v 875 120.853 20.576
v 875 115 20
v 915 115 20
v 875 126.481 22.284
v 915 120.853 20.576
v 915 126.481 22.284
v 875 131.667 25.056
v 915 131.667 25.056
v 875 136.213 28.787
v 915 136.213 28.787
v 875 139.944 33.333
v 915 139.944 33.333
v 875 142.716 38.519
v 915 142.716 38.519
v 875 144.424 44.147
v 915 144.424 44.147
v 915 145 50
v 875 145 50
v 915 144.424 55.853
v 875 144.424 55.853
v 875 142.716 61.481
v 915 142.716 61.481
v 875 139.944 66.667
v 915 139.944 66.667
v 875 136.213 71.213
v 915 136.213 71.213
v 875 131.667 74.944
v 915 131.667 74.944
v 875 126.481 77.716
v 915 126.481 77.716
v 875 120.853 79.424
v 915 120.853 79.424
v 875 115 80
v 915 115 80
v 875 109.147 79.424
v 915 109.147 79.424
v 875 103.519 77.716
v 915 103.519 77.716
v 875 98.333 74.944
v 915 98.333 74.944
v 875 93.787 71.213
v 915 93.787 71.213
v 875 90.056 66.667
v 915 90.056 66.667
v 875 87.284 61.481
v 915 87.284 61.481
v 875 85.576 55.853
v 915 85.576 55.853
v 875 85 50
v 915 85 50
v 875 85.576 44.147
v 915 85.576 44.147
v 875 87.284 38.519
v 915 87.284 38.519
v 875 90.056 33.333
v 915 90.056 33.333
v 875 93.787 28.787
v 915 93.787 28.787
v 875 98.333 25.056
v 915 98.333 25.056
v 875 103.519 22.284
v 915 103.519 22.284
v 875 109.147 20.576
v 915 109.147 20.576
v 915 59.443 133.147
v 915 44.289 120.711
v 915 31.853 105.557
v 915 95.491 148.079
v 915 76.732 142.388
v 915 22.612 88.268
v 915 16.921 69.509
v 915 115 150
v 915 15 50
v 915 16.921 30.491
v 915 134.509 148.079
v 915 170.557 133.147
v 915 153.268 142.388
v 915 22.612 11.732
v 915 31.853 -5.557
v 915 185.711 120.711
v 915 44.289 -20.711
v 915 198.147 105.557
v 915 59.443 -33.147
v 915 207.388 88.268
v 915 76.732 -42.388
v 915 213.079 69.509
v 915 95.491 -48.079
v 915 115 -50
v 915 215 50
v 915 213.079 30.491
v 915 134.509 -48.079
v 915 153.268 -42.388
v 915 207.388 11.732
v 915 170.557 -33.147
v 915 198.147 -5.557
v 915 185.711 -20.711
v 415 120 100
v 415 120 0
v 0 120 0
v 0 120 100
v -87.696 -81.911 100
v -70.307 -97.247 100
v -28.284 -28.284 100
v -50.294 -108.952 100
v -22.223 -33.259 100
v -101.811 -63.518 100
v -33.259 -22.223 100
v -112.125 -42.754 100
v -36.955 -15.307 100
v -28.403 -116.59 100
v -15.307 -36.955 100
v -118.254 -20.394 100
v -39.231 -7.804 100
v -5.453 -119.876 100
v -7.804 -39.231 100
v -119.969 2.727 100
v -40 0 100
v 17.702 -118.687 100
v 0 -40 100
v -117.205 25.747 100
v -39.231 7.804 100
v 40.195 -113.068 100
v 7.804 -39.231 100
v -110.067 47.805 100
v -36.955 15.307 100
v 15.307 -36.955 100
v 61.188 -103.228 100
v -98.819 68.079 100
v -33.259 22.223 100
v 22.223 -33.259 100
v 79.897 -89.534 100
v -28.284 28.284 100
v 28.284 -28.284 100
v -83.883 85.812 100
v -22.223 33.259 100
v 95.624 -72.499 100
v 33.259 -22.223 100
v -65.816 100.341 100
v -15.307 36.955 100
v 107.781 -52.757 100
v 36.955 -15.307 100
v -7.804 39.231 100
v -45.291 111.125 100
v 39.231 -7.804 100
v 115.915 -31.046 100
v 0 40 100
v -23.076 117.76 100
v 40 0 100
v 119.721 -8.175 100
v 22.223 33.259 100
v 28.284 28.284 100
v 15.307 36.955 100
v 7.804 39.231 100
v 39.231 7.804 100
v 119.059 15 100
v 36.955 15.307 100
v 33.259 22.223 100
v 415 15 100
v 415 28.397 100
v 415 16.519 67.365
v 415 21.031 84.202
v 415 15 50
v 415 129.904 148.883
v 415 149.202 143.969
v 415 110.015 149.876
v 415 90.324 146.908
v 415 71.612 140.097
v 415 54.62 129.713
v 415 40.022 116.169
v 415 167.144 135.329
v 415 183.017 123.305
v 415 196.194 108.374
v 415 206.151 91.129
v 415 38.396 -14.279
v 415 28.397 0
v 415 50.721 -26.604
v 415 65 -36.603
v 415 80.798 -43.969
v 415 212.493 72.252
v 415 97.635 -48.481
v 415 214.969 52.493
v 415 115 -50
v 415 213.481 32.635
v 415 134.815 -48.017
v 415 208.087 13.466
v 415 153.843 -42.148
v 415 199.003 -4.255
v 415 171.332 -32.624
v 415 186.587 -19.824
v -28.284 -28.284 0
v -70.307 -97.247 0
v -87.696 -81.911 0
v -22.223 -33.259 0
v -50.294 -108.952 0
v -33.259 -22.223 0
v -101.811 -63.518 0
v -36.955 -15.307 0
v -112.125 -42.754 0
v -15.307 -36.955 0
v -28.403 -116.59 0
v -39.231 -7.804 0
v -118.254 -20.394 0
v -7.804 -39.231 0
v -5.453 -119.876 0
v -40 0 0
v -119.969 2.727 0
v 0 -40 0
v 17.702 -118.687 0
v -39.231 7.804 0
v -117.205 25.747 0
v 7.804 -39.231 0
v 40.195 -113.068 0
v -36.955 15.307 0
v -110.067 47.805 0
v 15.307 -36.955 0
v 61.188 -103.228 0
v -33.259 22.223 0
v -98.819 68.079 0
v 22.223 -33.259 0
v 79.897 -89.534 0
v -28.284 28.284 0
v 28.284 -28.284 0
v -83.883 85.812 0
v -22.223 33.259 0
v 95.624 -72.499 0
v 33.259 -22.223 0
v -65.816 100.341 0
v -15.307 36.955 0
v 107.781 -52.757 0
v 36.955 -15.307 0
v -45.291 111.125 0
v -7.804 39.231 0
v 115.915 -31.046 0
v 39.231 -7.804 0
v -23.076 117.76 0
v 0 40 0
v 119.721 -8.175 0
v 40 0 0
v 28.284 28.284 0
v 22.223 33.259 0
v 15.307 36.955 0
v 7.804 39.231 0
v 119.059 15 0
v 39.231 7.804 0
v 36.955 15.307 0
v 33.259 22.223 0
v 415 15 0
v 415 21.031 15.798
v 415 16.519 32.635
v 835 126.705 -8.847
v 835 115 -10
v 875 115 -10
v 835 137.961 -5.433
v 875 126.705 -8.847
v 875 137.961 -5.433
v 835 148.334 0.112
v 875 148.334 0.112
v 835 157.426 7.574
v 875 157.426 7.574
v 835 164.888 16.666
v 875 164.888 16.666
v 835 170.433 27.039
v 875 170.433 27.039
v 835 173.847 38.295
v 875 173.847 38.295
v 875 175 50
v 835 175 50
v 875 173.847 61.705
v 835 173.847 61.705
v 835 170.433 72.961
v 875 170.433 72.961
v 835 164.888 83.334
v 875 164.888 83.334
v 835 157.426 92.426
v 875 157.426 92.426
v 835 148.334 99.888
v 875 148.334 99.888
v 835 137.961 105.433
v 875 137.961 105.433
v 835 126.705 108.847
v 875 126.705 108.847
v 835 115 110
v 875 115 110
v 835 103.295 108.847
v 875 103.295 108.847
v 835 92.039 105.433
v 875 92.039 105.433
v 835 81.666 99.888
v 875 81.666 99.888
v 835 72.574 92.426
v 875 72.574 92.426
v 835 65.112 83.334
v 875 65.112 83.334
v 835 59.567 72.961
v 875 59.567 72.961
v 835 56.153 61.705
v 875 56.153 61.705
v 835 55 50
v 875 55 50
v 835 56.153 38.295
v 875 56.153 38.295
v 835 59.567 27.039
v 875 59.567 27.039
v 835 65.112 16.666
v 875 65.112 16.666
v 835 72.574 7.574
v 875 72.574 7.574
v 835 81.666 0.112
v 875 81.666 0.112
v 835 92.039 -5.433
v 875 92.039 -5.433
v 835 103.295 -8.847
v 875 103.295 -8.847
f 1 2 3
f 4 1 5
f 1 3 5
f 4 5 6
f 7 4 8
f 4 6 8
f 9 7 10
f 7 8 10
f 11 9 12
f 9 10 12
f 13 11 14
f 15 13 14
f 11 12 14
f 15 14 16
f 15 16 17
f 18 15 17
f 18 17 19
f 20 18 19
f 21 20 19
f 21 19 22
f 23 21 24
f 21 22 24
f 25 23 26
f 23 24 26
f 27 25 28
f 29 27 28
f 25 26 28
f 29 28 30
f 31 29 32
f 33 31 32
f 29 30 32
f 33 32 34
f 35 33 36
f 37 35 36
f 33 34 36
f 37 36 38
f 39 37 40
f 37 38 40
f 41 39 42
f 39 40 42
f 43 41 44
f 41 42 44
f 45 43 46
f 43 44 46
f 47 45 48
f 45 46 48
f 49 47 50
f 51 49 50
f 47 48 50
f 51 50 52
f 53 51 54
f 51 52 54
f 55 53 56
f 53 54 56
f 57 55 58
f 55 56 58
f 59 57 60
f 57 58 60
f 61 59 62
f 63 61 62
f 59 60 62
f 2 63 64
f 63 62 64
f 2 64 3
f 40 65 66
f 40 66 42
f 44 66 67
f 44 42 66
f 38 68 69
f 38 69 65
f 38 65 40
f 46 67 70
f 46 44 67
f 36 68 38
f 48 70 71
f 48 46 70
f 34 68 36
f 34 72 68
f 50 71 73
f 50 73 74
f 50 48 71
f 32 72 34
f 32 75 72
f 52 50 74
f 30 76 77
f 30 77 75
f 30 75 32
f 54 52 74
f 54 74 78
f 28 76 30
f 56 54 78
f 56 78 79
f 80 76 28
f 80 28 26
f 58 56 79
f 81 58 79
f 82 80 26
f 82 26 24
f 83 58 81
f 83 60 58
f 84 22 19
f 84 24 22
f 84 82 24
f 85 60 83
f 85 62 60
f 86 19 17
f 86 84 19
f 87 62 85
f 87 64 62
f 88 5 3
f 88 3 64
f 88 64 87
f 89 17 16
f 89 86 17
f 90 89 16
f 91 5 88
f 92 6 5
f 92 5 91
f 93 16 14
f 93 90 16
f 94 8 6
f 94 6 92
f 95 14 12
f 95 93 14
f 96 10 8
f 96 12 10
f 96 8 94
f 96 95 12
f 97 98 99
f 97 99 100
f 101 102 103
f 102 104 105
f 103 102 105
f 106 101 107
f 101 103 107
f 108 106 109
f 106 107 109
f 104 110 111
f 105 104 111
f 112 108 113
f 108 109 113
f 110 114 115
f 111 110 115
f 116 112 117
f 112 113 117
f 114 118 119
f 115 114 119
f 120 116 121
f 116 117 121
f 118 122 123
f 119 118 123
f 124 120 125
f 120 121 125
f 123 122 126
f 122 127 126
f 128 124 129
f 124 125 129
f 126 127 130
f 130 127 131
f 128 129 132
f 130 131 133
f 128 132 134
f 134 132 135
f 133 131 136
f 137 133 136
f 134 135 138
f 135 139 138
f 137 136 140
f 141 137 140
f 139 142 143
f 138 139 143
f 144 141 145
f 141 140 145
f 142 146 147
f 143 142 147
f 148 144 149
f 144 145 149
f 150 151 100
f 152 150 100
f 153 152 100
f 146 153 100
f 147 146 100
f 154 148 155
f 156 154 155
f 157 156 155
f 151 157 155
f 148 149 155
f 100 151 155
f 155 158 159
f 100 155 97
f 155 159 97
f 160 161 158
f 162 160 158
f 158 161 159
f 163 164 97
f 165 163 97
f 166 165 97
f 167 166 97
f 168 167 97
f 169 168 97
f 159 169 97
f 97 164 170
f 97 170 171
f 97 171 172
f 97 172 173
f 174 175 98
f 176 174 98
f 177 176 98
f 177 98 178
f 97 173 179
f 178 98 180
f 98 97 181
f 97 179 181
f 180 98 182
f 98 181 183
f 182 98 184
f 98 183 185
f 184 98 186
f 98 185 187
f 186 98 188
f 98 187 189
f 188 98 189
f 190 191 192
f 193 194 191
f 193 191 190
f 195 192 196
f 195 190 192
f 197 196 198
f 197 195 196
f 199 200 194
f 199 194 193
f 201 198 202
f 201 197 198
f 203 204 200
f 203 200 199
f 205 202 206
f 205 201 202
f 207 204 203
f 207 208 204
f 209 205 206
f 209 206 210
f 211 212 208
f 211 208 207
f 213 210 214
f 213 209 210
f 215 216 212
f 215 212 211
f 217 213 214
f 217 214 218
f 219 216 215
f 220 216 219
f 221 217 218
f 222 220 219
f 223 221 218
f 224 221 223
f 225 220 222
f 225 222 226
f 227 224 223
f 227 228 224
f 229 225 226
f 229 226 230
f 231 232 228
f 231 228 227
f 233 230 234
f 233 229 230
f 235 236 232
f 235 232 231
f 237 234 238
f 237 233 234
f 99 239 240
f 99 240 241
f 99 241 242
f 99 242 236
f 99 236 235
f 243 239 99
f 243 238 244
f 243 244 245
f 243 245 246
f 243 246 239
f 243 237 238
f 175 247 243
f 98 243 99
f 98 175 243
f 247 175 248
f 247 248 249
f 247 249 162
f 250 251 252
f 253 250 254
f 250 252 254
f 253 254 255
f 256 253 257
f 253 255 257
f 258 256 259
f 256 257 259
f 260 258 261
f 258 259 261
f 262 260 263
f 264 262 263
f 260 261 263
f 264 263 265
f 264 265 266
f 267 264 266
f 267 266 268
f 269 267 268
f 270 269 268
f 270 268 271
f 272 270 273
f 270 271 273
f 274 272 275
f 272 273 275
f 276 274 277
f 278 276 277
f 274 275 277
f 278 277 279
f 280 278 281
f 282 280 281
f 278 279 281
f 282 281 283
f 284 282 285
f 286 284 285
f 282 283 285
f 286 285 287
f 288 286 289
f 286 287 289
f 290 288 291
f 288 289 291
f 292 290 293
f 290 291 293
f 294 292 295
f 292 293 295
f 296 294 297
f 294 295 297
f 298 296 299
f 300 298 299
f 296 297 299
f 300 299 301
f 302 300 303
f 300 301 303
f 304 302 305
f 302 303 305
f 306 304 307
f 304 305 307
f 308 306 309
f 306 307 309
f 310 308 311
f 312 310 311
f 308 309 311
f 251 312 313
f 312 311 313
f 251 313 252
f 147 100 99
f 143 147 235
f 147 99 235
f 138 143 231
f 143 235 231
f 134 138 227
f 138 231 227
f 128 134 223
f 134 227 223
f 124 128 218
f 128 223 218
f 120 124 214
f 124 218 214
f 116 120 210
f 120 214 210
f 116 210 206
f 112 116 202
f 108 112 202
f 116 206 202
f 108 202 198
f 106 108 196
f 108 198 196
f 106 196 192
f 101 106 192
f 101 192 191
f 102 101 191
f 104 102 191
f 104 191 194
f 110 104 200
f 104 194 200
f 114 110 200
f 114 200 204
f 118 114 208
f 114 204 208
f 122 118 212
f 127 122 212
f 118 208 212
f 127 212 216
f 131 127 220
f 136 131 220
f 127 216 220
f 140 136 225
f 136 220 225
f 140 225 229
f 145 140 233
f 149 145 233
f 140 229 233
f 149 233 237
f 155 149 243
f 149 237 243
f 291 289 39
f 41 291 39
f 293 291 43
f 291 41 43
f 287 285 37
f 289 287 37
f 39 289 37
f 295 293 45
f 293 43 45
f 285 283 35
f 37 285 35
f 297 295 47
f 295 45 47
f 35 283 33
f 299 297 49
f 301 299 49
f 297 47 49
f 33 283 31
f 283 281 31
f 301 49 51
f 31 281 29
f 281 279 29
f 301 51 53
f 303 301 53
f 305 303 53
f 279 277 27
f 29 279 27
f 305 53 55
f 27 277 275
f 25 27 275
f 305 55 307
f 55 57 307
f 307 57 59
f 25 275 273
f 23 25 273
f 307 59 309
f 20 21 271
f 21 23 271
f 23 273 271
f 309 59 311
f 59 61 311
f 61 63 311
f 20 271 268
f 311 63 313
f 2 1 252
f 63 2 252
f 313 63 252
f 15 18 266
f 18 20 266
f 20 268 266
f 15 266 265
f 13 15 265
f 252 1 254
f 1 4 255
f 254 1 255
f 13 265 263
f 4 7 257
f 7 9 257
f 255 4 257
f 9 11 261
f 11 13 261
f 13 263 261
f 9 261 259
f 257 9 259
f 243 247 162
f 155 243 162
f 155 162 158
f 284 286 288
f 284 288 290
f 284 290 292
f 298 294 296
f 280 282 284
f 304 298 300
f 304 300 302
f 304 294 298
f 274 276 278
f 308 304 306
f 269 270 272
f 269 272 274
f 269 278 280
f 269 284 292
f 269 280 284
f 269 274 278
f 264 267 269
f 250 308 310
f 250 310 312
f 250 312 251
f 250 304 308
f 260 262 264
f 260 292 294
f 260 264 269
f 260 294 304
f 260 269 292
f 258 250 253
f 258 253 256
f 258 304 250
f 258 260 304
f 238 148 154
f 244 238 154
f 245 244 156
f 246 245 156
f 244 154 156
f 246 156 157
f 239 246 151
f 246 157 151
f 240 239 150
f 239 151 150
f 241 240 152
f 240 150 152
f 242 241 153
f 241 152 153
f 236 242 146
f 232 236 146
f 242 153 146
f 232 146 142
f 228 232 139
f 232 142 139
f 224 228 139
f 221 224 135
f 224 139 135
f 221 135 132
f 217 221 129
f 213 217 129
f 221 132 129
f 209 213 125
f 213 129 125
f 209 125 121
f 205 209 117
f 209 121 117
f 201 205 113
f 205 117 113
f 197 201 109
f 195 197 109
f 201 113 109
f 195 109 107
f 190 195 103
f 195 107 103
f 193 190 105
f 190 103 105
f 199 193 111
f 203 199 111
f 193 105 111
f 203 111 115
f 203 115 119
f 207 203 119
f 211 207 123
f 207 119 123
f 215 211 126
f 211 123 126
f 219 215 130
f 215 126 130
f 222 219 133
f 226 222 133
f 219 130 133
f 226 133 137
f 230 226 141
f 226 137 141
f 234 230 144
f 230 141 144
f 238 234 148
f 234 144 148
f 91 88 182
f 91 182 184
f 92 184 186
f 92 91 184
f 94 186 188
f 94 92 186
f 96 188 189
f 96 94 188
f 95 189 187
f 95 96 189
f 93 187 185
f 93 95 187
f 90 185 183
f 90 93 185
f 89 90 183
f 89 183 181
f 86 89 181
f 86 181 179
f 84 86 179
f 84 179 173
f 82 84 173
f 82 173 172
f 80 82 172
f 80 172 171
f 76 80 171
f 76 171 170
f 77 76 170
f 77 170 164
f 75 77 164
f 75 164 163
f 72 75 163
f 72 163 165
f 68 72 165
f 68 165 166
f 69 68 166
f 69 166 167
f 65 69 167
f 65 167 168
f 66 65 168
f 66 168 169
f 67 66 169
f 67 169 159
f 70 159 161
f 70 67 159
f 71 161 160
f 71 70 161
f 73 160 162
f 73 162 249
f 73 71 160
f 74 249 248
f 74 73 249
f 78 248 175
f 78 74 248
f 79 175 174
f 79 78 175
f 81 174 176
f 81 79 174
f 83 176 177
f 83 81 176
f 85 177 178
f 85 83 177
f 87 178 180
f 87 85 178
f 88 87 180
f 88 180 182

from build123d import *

# Parameters (mm, degrees)
SKETCH1_R                = 120
BOSS_EXTRUDE2_DEPTH      = 100
SKETCH2_R                = 40
CUT_EXTRUDE1_DEPTH       = 100
SKETCH3_R                = 100
BOSS_EXTRUDE3_DEPTH      = 500
BOSS_EXTRUDE4_REACH      = 597.777
BOSS_EXTRUDE4_END_RADIUS = 120
SKETCH4_W                = 100
SKETCH4_H                = 105
SKETCH5_R                = 30
CUT_EXTRUDE2_DEPTH       = 40
SKETCH6_R                = 60
CUT_EXTRUDE3_DEPTH       = 40


with BuildPart() as part:
    # Sketch1 → Boss-Extrude2 (new body)
    with BuildSketch(Plane.XY):
        Circle(SKETCH1_R)
    extrude(amount=BOSS_EXTRUDE2_DEPTH)

    # Sketch2 → Cut-Extrude1 (cut)
    with BuildSketch(Plane.XY.offset(100)):
        Circle(SKETCH2_R)
    extrude(amount=-CUT_EXTRUDE1_DEPTH, mode=Mode.SUBTRACT)



with BuildPart() as body_2:
    # Sketch3 → Boss-Extrude3 (new body)
    with BuildSketch(Plane(origin=(915, 0, 0), x_dir=(0, 0, -1), z_dir=(1, 0, 0))):
        with Locations((-50, 115)):
            Circle(SKETCH3_R)
    extrude(amount=-BOSS_EXTRUDE3_DEPTH)


with BuildPart() as part_1:
    add(part.part)

    add(body_2.part)  # Boss-Extrude4 merges body 2
    # Boss-Extrude4: up to this cylinder (the profile starts outside it)
    boss_extrude4_end = Plane(origin=(0, 0, 50), z_dir=(0, 0, -1)) * Cylinder(BOSS_EXTRUDE4_END_RADIUS, 1436.554, mode=Mode.PRIVATE)
    # Sketch4 → Boss-Extrude4 (add, up to the surface)
    with BuildSketch(Plane.ZY.offset(-415), mode=Mode.PRIVATE) as boss_extrude4_sk1:
        with Locations((50, 67.5)):
            Rectangle(SKETCH4_W, SKETCH4_H)
    boss_extrude4_tool1 = extrude(boss_extrude4_sk1.sketch, amount=BOSS_EXTRUDE4_REACH, mode=Mode.PRIVATE) - boss_extrude4_end
    add(boss_extrude4_tool1.solids().sort_by_distance((415, 67.5, 50))[0])

    # Sketch5 → Cut-Extrude2 (cut)
    with BuildSketch(Plane(origin=(915, 0, 0), x_dir=(0, 0, -1), z_dir=(1, 0, 0))):
        with Locations((-50, 115)):
            Circle(SKETCH5_R)
    extrude(amount=-CUT_EXTRUDE2_DEPTH, mode=Mode.SUBTRACT)

    # Sketch6 → Cut-Extrude3 (cut)
    with BuildSketch(Plane(origin=(875, 0, 0), x_dir=(0, 0, -1), z_dir=(1, 0, 0))):
        with Locations((-50, 115)):
            Circle(SKETCH6_R)
    extrude(amount=-CUT_EXTRUDE3_DEPTH, mode=Mode.SUBTRACT)


solid = part_1.part
